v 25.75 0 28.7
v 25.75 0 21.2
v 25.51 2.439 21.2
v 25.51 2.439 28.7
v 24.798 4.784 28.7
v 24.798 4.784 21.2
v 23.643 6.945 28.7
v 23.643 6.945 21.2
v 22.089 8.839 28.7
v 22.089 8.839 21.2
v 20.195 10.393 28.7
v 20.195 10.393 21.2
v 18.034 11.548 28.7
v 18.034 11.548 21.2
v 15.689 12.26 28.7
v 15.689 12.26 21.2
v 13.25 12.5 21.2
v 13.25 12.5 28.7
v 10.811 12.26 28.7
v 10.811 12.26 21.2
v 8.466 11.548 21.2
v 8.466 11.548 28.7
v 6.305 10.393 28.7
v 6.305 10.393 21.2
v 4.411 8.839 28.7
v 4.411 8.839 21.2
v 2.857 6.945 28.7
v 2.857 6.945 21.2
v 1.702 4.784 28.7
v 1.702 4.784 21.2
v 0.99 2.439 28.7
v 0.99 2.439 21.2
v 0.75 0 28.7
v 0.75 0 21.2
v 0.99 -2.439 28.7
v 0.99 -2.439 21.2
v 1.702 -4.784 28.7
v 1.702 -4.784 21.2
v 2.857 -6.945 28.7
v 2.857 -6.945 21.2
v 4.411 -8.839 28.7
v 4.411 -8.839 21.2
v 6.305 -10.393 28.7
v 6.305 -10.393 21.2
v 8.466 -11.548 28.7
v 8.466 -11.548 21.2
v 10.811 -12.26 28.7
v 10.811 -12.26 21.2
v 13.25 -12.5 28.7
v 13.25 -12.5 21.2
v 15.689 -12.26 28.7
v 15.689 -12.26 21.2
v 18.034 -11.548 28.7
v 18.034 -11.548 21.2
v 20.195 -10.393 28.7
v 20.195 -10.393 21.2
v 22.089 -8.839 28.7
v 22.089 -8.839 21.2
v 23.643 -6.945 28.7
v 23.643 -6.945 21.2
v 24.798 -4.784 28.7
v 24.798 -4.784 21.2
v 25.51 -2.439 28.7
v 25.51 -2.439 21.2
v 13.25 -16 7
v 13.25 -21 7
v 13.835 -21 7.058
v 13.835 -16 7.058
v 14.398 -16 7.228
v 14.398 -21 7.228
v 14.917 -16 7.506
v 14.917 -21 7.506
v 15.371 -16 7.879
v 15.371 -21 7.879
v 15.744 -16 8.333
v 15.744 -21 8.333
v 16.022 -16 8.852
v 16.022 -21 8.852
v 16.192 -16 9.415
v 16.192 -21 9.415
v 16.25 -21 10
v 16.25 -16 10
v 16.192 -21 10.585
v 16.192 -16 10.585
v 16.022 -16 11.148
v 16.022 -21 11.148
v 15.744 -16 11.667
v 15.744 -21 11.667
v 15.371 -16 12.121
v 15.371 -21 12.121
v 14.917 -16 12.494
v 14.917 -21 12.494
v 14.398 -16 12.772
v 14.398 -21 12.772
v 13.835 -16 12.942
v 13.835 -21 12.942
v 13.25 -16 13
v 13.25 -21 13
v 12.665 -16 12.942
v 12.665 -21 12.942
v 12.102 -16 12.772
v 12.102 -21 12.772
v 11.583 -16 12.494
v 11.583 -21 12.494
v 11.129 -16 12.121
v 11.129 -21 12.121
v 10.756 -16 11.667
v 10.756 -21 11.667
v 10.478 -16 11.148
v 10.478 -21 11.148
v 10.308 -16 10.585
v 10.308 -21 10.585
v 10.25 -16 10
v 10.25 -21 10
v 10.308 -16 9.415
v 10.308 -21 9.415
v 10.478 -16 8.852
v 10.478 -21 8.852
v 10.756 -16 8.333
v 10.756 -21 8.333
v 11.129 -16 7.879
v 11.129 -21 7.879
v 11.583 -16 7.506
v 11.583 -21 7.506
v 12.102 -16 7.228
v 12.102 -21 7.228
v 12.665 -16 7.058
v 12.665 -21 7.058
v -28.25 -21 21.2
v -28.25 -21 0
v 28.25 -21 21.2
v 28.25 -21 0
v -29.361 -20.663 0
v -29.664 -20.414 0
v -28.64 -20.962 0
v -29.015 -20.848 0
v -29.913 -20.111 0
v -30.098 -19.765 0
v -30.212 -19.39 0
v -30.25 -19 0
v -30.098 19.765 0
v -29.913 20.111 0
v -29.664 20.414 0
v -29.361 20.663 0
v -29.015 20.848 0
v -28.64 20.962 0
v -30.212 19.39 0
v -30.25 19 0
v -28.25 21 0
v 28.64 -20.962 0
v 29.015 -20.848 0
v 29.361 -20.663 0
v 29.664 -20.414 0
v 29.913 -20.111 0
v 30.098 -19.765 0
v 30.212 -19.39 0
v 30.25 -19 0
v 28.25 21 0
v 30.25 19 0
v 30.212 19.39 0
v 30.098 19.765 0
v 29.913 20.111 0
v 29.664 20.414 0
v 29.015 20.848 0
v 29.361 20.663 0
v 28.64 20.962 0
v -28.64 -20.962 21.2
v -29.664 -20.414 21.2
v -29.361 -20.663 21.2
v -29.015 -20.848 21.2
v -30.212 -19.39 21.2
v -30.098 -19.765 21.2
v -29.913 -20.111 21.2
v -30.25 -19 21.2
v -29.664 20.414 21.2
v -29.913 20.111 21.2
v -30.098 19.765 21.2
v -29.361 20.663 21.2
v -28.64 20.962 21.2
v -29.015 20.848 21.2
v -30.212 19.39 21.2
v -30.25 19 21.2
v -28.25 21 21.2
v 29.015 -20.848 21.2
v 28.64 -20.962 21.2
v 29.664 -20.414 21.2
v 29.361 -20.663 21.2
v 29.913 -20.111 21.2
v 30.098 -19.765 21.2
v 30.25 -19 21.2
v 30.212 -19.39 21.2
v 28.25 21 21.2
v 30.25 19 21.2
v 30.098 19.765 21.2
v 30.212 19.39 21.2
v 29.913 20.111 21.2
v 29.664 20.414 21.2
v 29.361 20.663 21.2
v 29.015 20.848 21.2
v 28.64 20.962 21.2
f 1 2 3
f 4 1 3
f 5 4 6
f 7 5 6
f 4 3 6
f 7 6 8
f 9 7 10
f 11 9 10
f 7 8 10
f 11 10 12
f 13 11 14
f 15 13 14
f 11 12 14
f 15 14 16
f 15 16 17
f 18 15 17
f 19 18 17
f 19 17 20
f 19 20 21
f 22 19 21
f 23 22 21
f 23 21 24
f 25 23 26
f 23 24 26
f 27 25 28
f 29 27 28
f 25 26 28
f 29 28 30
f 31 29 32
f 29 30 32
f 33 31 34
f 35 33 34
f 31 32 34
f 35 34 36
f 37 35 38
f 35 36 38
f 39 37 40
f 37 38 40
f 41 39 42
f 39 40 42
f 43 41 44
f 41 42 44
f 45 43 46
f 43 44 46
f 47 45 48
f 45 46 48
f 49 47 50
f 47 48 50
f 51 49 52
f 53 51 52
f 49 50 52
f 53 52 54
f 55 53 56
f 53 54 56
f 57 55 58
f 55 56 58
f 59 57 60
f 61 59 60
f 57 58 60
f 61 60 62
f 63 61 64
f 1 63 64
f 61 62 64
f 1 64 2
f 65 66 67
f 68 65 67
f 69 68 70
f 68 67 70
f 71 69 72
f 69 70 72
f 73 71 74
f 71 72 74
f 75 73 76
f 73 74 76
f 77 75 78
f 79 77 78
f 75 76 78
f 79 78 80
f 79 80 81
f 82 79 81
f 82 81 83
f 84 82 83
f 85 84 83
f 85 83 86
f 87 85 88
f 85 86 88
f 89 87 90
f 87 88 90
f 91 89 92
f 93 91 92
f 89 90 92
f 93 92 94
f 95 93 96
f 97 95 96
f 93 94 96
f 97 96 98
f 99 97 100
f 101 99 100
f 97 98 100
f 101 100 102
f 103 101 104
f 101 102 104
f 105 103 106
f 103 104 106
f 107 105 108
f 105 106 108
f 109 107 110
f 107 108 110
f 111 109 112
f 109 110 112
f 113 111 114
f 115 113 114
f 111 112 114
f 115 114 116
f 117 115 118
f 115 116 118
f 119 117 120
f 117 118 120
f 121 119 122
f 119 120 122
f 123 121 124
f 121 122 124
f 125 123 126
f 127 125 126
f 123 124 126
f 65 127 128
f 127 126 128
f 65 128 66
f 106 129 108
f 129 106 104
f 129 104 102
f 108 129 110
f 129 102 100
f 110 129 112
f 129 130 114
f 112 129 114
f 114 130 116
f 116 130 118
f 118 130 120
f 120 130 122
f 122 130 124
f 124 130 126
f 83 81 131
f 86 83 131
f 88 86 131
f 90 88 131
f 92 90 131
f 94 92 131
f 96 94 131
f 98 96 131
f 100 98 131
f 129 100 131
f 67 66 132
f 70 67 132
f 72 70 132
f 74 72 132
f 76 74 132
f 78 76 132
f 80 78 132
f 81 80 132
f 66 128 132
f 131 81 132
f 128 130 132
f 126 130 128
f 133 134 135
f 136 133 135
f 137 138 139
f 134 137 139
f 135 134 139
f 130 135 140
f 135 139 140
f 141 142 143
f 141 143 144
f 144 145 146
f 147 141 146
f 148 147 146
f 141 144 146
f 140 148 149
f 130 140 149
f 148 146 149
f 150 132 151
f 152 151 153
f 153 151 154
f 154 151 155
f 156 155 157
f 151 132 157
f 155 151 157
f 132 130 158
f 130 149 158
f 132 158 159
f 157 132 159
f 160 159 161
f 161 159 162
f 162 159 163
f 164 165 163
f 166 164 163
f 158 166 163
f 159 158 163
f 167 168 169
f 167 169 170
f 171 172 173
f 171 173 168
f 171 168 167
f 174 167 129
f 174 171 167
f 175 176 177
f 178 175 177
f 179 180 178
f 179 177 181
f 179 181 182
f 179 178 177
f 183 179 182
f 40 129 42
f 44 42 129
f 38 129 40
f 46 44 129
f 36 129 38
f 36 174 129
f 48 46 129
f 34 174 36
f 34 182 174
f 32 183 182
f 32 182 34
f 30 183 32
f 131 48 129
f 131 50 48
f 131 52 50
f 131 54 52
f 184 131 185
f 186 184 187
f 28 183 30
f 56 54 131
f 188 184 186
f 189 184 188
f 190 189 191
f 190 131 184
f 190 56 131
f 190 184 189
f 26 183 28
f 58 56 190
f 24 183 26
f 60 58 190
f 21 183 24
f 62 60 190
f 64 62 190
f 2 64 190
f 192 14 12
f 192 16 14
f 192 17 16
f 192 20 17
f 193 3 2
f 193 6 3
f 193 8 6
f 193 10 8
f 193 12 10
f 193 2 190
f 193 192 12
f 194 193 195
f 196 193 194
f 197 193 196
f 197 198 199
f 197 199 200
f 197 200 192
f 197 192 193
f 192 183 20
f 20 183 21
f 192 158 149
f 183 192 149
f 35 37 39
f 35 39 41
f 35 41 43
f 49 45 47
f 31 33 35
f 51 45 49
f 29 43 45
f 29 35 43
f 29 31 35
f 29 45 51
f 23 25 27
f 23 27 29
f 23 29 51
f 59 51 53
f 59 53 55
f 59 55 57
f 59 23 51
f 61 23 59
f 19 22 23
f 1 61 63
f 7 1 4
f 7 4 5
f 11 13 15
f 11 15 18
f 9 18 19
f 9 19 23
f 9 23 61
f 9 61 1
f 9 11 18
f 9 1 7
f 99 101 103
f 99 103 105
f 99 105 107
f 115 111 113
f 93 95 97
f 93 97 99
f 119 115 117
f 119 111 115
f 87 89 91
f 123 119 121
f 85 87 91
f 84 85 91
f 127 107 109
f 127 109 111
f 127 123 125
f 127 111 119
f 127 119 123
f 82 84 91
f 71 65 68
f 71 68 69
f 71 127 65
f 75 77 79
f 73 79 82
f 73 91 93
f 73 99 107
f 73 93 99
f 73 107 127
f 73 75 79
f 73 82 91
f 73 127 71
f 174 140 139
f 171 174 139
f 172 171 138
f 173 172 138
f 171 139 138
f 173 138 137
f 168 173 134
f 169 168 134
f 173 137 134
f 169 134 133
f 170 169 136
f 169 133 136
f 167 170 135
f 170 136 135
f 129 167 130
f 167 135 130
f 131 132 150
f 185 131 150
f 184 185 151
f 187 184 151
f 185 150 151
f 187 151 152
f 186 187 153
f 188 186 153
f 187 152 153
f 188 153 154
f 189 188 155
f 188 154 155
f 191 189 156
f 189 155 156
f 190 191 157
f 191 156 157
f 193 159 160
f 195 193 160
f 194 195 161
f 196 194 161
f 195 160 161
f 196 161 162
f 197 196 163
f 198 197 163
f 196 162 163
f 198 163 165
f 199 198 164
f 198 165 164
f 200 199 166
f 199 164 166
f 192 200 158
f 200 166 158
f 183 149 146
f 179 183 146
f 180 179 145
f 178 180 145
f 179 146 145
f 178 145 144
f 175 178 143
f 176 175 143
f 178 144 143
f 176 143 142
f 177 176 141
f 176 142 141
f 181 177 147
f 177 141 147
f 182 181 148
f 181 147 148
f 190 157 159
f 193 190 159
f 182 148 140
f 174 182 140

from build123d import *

# Parameters (mm, degrees)
BOSS_EXTRUDE1_DEPTH = 21.2
SKETCH2_R           = 12.5
BOSS_EXTRUDE2_DEPTH = 7.5
SKETCH3_R           = 3
CUT_EXTRUDE1_DEPTH  = 5


with BuildPart() as part:
    # Sketch1 → Boss-Extrude1 (new body)
    with BuildSketch(Plane.XY):
        with BuildLine():
            Line((-28.25, -21), (28.25, -21))
            ThreePointArc((28.25, -21), (29.664213562, -20.414213562), (30.25, -19))
            Line((30.25, -19), (30.25, 19))
            ThreePointArc((30.25, 19), (29.664213562, 20.414213562), (28.25, 21))
            Line((28.25, 21), (-28.25, 21))
            ThreePointArc((-28.25, 21), (-29.664213562, 20.414213562), (-30.25, 19))
            Line((-30.25, 19), (-30.25, -19))
            ThreePointArc((-30.25, -19), (-29.664213562, -20.414213562), (-28.25, -21))
        make_face()
    extrude(amount=BOSS_EXTRUDE1_DEPTH)

    # Sketch2 → Boss-Extrude2 (add)
    with BuildSketch(Plane.XY.offset(21.2)):
        with Locations((13.25, 0)):
            Circle(SKETCH2_R)
    extrude(amount=BOSS_EXTRUDE2_DEPTH)

    # Sketch3 → Cut-Extrude1 (cut)
    with BuildSketch(Plane.XZ.offset(21)):
        with Locations(Location((13.25, 10, 0), (0, 0, 270))):
            Circle(SKETCH3_R)
    extrude(amount=-CUT_EXTRUDE1_DEPTH, mode=Mode.SUBTRACT)


solid = part.part
